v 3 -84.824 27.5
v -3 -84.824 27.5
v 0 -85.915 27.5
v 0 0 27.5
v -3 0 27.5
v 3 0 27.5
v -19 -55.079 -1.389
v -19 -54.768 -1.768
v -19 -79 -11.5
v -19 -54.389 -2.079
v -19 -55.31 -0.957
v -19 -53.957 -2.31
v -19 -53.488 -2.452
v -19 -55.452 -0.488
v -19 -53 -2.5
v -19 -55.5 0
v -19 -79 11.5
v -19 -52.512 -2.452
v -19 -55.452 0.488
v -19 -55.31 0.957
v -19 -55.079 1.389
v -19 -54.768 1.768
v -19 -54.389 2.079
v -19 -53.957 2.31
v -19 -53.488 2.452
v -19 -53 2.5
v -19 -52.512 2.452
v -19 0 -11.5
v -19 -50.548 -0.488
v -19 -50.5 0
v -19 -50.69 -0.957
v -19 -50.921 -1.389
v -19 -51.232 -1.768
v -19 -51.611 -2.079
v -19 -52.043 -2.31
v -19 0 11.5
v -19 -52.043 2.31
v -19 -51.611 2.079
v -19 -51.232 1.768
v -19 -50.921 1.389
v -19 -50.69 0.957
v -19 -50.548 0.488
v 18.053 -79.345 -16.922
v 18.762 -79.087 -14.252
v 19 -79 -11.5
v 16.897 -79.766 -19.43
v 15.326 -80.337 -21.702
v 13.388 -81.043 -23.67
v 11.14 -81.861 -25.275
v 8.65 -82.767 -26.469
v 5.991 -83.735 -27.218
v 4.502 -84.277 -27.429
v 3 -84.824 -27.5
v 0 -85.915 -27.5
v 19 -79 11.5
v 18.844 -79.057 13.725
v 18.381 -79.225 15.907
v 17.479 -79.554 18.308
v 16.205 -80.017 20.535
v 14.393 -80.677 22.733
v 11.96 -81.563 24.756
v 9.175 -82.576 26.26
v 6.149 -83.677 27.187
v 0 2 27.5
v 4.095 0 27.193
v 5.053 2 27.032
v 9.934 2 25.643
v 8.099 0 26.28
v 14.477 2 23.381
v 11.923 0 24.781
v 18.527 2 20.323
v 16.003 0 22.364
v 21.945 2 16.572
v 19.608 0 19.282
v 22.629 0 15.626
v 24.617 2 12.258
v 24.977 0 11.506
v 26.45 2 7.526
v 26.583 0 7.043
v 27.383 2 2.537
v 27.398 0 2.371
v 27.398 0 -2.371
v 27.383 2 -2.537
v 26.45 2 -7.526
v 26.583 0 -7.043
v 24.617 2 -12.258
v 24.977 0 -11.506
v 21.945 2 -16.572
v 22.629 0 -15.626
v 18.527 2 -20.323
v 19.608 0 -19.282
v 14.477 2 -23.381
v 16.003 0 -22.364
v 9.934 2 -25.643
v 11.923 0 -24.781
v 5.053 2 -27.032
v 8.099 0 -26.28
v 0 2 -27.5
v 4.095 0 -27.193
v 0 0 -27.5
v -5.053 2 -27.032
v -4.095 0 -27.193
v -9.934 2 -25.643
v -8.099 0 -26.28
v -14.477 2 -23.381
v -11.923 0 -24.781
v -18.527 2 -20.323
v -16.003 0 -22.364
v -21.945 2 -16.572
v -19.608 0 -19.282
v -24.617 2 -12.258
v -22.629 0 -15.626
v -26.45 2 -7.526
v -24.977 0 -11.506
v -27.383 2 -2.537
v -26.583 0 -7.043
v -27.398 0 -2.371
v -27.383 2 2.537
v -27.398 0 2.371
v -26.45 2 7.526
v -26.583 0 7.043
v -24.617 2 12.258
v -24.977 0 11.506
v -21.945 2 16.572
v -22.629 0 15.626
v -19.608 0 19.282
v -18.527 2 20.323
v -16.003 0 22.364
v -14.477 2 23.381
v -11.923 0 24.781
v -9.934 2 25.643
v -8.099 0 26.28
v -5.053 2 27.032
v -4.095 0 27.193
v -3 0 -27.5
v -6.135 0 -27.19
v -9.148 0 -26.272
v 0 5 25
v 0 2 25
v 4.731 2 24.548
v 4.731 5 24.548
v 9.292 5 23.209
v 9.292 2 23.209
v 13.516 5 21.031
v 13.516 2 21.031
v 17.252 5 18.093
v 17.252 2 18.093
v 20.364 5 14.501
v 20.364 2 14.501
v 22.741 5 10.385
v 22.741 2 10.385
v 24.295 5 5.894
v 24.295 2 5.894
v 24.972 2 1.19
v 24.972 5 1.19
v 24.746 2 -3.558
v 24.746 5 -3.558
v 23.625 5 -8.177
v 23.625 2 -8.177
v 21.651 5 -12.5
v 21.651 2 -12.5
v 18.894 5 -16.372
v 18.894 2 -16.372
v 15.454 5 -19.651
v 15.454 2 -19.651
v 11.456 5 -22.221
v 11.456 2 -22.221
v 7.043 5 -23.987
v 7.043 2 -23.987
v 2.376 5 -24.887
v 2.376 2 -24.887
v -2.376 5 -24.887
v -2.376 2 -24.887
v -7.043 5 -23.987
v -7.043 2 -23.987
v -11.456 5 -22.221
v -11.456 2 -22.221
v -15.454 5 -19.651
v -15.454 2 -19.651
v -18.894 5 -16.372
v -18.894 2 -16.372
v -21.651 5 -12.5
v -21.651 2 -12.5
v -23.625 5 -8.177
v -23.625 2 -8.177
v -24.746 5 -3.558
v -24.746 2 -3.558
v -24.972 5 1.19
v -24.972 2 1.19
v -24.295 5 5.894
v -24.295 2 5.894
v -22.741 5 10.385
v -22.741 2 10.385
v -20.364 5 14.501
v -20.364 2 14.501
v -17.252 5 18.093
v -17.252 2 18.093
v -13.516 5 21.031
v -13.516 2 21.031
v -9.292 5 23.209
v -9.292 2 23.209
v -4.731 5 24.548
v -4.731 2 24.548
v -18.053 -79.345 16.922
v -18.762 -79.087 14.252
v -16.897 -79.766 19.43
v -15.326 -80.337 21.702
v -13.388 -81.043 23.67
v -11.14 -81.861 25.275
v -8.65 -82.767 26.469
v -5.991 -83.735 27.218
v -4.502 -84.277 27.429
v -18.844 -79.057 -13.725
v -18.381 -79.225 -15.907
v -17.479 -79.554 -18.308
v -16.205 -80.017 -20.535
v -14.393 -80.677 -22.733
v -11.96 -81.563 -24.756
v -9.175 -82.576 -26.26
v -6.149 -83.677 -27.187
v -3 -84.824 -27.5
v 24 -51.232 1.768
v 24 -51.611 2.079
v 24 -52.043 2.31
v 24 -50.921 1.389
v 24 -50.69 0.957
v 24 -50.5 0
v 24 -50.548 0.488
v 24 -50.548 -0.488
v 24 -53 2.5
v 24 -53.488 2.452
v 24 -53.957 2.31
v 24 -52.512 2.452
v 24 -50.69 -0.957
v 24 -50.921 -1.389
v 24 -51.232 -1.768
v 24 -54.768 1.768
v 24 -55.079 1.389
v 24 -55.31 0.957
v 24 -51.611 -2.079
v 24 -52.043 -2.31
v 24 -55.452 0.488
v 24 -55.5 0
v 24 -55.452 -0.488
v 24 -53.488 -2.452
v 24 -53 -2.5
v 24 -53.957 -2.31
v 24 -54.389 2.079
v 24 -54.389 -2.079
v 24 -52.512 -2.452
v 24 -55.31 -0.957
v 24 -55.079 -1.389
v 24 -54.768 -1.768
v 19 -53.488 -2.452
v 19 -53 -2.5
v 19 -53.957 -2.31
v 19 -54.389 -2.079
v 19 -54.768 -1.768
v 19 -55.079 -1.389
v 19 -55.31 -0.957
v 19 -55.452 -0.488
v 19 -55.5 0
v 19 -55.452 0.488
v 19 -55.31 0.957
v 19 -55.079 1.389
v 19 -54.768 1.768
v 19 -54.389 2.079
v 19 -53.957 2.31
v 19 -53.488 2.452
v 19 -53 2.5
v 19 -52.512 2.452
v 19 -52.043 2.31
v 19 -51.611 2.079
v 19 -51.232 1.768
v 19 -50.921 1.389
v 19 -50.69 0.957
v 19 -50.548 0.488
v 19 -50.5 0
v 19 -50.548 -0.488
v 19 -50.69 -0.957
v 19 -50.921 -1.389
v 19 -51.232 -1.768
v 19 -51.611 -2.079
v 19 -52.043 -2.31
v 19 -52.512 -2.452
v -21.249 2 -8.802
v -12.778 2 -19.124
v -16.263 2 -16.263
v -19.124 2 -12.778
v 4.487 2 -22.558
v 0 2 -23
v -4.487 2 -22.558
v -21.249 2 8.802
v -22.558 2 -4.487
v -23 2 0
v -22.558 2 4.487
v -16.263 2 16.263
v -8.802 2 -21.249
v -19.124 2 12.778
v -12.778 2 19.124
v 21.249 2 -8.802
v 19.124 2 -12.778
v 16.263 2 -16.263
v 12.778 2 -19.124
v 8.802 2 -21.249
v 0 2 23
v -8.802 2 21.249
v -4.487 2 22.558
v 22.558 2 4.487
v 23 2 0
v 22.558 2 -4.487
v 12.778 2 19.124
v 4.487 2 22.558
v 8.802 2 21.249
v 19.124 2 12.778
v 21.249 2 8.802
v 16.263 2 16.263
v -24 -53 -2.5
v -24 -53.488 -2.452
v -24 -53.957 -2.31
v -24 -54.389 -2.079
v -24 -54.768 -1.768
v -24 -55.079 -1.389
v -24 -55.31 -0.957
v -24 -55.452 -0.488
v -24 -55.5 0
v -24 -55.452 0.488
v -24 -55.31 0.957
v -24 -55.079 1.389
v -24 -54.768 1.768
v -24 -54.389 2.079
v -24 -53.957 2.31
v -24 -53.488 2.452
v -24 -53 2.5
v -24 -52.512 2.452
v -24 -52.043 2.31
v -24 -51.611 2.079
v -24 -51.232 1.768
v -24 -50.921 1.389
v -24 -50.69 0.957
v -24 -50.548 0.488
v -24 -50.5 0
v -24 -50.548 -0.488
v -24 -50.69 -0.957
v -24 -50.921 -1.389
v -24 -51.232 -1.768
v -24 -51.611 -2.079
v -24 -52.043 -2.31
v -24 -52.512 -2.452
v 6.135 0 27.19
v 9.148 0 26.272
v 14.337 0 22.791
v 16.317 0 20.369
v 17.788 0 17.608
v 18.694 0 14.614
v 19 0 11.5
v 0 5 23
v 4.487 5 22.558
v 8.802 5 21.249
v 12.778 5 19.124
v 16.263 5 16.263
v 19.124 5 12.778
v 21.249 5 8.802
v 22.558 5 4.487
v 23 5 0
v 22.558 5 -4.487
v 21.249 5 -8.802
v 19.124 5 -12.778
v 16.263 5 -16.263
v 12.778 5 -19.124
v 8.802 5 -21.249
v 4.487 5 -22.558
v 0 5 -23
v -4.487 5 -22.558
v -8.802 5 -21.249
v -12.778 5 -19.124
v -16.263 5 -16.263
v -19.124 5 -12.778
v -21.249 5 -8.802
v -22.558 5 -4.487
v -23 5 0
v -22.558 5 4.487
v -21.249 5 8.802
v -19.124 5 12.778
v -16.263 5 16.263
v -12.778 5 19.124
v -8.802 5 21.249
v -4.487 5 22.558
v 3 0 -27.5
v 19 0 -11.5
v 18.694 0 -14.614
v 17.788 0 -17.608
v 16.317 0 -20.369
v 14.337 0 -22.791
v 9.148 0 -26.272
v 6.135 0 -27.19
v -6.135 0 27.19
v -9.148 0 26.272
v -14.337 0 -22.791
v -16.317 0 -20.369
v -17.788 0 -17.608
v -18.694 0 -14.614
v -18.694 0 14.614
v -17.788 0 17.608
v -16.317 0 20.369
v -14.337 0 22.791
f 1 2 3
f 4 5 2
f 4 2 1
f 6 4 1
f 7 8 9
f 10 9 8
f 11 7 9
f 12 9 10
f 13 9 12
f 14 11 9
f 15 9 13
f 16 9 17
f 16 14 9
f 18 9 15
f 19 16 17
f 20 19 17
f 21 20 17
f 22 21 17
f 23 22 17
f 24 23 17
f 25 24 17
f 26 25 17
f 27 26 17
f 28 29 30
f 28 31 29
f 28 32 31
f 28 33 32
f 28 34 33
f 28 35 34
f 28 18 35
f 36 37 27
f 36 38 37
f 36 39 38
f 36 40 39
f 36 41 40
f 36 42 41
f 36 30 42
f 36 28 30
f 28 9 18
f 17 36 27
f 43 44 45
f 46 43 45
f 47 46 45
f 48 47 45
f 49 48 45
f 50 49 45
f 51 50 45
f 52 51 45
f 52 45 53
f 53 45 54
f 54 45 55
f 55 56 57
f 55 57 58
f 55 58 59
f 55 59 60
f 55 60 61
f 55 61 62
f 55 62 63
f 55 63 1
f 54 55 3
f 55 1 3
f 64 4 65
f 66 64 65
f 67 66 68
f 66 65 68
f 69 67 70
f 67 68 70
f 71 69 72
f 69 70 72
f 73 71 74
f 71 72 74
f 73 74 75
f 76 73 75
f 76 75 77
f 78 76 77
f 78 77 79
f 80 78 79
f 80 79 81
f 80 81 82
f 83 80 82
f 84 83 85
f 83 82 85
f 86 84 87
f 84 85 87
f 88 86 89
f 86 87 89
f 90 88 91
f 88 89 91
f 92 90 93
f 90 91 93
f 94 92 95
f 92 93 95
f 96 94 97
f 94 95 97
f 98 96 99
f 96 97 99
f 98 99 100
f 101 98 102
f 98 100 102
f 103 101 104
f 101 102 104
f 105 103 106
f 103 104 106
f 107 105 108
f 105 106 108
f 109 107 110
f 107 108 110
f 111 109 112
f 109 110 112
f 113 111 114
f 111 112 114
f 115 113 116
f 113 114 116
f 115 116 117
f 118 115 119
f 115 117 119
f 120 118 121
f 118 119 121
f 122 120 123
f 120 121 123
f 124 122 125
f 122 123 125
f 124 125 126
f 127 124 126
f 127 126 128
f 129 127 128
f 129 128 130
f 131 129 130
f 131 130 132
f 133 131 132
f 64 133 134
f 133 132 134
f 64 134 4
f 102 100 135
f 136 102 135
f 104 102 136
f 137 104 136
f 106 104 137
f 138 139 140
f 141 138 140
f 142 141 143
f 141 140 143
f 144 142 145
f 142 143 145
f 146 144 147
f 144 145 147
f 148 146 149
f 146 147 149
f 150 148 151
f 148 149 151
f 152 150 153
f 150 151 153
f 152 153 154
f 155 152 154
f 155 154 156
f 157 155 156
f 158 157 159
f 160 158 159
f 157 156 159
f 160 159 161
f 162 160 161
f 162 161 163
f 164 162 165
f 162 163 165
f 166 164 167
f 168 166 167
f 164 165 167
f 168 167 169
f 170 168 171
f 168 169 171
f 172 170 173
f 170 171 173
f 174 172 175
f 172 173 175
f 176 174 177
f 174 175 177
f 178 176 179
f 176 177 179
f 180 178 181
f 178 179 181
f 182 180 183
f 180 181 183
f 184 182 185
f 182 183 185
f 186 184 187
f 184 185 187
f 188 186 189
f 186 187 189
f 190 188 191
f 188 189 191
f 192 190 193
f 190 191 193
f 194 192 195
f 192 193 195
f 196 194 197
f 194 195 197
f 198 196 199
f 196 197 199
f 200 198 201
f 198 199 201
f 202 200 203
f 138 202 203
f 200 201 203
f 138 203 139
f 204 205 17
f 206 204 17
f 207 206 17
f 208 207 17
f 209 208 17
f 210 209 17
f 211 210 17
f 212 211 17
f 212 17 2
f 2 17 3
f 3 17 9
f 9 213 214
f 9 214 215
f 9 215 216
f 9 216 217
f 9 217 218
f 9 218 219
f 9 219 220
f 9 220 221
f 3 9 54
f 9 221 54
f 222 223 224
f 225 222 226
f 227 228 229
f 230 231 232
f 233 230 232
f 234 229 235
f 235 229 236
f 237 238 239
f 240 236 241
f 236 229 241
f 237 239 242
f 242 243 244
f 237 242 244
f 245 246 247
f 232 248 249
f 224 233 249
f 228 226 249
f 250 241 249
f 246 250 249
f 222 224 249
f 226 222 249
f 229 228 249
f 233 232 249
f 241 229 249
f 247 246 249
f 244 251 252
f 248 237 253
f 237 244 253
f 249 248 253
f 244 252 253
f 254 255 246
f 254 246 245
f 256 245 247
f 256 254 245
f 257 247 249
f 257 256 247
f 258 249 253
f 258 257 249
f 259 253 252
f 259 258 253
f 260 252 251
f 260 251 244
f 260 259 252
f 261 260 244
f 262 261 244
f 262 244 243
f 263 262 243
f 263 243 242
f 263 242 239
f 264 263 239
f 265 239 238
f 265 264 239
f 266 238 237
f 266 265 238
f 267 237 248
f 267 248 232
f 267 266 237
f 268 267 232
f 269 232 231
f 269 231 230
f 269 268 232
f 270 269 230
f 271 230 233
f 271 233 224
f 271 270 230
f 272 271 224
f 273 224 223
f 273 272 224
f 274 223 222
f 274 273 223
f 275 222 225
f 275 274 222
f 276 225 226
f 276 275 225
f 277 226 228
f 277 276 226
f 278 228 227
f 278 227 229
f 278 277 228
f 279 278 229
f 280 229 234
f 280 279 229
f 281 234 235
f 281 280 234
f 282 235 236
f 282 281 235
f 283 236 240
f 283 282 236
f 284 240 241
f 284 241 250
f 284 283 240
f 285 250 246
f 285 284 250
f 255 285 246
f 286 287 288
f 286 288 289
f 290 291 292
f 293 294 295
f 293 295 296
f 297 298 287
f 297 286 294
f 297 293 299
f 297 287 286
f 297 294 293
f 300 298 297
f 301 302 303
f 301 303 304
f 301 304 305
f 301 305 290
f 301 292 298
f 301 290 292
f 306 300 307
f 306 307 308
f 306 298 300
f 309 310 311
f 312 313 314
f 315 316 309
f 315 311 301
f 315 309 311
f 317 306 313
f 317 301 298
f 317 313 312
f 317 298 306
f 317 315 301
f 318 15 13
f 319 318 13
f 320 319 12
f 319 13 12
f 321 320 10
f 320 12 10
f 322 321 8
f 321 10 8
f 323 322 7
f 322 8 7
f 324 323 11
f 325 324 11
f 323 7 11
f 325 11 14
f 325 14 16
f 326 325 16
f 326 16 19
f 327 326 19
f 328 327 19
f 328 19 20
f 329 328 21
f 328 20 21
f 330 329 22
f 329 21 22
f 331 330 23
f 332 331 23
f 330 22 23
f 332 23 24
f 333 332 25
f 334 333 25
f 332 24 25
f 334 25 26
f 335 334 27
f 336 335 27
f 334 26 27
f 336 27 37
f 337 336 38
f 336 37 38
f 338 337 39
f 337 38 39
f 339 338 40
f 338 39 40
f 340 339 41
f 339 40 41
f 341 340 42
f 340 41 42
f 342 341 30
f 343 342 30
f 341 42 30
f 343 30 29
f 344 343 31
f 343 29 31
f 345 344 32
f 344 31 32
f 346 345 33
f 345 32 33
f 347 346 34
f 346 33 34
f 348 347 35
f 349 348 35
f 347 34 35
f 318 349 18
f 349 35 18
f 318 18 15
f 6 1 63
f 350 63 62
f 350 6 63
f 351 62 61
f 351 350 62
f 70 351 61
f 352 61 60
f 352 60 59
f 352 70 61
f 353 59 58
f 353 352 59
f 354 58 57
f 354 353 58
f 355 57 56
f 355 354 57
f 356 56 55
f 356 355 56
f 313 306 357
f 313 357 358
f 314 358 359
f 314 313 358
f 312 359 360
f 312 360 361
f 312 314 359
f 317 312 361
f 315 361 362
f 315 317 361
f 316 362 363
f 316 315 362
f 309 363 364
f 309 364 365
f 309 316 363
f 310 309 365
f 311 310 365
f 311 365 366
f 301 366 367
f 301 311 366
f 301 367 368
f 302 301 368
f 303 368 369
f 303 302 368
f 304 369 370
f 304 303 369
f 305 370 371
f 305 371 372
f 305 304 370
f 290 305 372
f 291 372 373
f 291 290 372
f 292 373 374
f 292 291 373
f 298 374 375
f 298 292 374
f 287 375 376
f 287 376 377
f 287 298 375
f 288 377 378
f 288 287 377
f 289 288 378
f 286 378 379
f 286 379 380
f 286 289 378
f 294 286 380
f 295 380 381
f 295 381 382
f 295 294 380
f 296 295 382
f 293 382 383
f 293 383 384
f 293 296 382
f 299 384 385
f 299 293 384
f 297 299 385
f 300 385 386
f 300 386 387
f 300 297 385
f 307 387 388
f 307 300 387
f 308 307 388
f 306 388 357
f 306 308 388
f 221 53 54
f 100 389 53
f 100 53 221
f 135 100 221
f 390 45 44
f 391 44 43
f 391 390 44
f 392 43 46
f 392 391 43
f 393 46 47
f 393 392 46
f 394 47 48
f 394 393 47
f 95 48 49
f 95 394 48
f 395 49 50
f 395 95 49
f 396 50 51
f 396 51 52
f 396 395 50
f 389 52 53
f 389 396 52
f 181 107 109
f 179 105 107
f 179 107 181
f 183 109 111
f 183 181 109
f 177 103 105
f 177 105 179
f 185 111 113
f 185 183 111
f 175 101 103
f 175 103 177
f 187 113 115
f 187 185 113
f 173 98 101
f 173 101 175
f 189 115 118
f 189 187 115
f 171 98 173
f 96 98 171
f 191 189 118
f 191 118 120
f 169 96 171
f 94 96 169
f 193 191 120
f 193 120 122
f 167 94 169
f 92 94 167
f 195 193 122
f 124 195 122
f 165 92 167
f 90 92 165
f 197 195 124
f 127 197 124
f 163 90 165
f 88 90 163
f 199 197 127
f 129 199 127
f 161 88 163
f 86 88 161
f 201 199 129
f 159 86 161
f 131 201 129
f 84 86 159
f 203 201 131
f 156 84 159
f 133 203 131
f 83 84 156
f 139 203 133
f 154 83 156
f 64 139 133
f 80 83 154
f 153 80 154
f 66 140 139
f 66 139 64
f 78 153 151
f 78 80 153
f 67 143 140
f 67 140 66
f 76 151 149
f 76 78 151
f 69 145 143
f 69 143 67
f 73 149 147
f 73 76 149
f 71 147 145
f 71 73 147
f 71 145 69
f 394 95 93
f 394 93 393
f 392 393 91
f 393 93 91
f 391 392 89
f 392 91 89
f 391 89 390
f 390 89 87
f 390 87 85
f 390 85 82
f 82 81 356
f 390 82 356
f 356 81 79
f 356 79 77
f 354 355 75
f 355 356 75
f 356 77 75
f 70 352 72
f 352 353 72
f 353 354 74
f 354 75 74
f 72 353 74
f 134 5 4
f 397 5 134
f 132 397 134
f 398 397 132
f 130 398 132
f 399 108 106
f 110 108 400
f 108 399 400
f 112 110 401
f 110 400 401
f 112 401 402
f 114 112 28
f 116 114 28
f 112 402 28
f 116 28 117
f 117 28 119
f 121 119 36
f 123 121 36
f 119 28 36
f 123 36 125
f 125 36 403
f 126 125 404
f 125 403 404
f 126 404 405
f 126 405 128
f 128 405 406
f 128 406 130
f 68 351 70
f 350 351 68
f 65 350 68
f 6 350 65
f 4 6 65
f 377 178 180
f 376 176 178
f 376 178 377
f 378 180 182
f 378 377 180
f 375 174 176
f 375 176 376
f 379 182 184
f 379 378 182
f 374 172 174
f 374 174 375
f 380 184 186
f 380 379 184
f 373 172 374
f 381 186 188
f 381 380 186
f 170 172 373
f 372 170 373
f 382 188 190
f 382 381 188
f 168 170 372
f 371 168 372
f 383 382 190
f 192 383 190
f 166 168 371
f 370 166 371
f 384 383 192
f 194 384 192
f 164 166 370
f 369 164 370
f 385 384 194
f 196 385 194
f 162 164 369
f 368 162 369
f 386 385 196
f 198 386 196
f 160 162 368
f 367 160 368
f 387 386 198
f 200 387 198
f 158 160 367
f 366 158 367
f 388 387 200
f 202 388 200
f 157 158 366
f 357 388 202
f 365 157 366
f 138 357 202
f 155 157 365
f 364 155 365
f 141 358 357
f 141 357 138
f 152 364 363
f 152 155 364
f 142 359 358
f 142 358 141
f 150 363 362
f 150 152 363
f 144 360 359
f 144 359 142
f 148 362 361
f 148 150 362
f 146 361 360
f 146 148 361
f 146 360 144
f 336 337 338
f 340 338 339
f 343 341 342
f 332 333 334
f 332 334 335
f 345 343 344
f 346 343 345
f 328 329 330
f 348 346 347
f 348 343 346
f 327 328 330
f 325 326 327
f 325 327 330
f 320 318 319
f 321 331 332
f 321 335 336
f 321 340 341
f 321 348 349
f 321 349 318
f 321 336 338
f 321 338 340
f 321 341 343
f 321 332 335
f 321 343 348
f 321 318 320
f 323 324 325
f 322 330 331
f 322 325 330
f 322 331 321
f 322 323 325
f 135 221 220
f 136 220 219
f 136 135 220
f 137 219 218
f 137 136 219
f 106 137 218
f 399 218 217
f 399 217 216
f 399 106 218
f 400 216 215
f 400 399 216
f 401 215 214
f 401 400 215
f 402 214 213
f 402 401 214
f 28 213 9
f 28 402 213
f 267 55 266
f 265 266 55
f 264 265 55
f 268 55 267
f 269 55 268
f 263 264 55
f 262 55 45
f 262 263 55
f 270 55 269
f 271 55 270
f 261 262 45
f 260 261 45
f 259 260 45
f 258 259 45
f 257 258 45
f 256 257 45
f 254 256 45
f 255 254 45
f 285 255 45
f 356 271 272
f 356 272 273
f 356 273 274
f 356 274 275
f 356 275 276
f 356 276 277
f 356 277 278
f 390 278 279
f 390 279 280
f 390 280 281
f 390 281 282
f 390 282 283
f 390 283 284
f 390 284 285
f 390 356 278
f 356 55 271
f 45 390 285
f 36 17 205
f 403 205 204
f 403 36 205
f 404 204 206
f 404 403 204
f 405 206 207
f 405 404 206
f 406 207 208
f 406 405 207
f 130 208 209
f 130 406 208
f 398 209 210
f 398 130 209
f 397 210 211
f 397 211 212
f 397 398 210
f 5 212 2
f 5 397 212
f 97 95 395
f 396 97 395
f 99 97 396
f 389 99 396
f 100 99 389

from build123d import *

# Parameters (mm, degrees)
SKETCH1_R           = 27.5
BOSS_EXTRUDE1_DEPTH = 2
SKETCH2_R           = 25
SKETCH2_R_2         = 23
BOSS_EXTRUDE2_DEPTH = 3
BOSS_EXTRUDE3_DEPTH = 87
CHAMFER2_SIZE       = 8
CHAMFER2_SIZE_2     = 21.979819356
SKETCH5_R           = 2.5
BOSS_EXTRUDE4_DEPTH = 5


with BuildPart() as part:
    # Sketch1 → Boss-Extrude1 (new body)
    with BuildSketch(Plane(origin=(0, 0, 0), x_dir=(1, 0, 0), z_dir=(0, 1, 0))):
        with Locations(Location((0, 0, 0), (0, 0, 270))):
            Circle(SKETCH1_R)
    extrude(amount=BOSS_EXTRUDE1_DEPTH)

    # Sketch2 → Boss-Extrude2 (add)
    with BuildSketch(Plane(origin=(0, 2, 0), x_dir=(1, 0, 0), z_dir=(0, 1, 0))):
        with Locations(Location((0, 0, 0), (0, 0, 270))):
            Circle(SKETCH2_R)
        with Locations(Location((0, 0, 0), (0, 0, 270))):
            Circle(SKETCH2_R_2, mode=Mode.SUBTRACT)
    extrude(amount=BOSS_EXTRUDE2_DEPTH)

    # Sketch3 → Boss-Extrude3 (add)
    with BuildSketch(Plane.XZ):
        with BuildLine():
            Line((3, -27.5), (-3, -27.5))
            ThreePointArc((-3, -27.5), (-14.313708499, -22.813708499), (-19, -11.5))
            Line((-19, -11.5), (-19, 11.5))
            ThreePointArc((-19, 11.5), (-14.313708499, 22.813708499), (-3, 27.5))
            Line((-3, 27.5), (3, 27.5))
            ThreePointArc((3, 27.5), (14.313708499, 22.813708499), (19, 11.5))
            Line((19, 11.5), (19, -11.5))
            ThreePointArc((19, -11.5), (14.313708499, -22.813708499), (3, -27.5))
        make_face()
    extrude(amount=BOSS_EXTRUDE3_DEPTH)

    # Chamfer2
    # the kernel refuses this chamfer: 21.979819356, 8 mm, written as the material it takes off along each edge
    with BuildSketch(Plane(origin=(19, -87, 68.519931595), x_dir=(0.0990409022520504, 0.9950833631817486, 0), z_dir=(0, 0, -1)), Plane(origin=(-19, -87, -68.519931595), x_dir=(-0.0990409022520504, 0.9950833631817486, 0), z_dir=(0, 0, 1))) as chamfer2_piece_1:
        Polygon((CHAMFER2_SIZE * 0.995083363182, -CHAMFER2_SIZE * 0.0990409022521), (-CHAMFER2_SIZE_2 * 0.0990409022504, -CHAMFER2_SIZE_2 * 0.995083363165), (0, 0), align=None)
    extrude(amount=137.03986319, mode=Mode.SUBTRACT)

    # Sketch5 → Boss-Extrude4 (add)
    with BuildSketch(Plane.ZY.offset(19)):
        with Locations(Location((0, -53, 0), (0, 0, 180))):
            Circle(SKETCH5_R)
    boss_extrude4 = extrude(amount=BOSS_EXTRUDE4_DEPTH)

    # Mirror1: Boss-Extrude4 across plane
    add(boss_extrude4.mirror(Plane(origin=(0, 0, 0), x_dir=(0, 0, 1), z_dir=(1, 0, 0))))


solid = part.part
